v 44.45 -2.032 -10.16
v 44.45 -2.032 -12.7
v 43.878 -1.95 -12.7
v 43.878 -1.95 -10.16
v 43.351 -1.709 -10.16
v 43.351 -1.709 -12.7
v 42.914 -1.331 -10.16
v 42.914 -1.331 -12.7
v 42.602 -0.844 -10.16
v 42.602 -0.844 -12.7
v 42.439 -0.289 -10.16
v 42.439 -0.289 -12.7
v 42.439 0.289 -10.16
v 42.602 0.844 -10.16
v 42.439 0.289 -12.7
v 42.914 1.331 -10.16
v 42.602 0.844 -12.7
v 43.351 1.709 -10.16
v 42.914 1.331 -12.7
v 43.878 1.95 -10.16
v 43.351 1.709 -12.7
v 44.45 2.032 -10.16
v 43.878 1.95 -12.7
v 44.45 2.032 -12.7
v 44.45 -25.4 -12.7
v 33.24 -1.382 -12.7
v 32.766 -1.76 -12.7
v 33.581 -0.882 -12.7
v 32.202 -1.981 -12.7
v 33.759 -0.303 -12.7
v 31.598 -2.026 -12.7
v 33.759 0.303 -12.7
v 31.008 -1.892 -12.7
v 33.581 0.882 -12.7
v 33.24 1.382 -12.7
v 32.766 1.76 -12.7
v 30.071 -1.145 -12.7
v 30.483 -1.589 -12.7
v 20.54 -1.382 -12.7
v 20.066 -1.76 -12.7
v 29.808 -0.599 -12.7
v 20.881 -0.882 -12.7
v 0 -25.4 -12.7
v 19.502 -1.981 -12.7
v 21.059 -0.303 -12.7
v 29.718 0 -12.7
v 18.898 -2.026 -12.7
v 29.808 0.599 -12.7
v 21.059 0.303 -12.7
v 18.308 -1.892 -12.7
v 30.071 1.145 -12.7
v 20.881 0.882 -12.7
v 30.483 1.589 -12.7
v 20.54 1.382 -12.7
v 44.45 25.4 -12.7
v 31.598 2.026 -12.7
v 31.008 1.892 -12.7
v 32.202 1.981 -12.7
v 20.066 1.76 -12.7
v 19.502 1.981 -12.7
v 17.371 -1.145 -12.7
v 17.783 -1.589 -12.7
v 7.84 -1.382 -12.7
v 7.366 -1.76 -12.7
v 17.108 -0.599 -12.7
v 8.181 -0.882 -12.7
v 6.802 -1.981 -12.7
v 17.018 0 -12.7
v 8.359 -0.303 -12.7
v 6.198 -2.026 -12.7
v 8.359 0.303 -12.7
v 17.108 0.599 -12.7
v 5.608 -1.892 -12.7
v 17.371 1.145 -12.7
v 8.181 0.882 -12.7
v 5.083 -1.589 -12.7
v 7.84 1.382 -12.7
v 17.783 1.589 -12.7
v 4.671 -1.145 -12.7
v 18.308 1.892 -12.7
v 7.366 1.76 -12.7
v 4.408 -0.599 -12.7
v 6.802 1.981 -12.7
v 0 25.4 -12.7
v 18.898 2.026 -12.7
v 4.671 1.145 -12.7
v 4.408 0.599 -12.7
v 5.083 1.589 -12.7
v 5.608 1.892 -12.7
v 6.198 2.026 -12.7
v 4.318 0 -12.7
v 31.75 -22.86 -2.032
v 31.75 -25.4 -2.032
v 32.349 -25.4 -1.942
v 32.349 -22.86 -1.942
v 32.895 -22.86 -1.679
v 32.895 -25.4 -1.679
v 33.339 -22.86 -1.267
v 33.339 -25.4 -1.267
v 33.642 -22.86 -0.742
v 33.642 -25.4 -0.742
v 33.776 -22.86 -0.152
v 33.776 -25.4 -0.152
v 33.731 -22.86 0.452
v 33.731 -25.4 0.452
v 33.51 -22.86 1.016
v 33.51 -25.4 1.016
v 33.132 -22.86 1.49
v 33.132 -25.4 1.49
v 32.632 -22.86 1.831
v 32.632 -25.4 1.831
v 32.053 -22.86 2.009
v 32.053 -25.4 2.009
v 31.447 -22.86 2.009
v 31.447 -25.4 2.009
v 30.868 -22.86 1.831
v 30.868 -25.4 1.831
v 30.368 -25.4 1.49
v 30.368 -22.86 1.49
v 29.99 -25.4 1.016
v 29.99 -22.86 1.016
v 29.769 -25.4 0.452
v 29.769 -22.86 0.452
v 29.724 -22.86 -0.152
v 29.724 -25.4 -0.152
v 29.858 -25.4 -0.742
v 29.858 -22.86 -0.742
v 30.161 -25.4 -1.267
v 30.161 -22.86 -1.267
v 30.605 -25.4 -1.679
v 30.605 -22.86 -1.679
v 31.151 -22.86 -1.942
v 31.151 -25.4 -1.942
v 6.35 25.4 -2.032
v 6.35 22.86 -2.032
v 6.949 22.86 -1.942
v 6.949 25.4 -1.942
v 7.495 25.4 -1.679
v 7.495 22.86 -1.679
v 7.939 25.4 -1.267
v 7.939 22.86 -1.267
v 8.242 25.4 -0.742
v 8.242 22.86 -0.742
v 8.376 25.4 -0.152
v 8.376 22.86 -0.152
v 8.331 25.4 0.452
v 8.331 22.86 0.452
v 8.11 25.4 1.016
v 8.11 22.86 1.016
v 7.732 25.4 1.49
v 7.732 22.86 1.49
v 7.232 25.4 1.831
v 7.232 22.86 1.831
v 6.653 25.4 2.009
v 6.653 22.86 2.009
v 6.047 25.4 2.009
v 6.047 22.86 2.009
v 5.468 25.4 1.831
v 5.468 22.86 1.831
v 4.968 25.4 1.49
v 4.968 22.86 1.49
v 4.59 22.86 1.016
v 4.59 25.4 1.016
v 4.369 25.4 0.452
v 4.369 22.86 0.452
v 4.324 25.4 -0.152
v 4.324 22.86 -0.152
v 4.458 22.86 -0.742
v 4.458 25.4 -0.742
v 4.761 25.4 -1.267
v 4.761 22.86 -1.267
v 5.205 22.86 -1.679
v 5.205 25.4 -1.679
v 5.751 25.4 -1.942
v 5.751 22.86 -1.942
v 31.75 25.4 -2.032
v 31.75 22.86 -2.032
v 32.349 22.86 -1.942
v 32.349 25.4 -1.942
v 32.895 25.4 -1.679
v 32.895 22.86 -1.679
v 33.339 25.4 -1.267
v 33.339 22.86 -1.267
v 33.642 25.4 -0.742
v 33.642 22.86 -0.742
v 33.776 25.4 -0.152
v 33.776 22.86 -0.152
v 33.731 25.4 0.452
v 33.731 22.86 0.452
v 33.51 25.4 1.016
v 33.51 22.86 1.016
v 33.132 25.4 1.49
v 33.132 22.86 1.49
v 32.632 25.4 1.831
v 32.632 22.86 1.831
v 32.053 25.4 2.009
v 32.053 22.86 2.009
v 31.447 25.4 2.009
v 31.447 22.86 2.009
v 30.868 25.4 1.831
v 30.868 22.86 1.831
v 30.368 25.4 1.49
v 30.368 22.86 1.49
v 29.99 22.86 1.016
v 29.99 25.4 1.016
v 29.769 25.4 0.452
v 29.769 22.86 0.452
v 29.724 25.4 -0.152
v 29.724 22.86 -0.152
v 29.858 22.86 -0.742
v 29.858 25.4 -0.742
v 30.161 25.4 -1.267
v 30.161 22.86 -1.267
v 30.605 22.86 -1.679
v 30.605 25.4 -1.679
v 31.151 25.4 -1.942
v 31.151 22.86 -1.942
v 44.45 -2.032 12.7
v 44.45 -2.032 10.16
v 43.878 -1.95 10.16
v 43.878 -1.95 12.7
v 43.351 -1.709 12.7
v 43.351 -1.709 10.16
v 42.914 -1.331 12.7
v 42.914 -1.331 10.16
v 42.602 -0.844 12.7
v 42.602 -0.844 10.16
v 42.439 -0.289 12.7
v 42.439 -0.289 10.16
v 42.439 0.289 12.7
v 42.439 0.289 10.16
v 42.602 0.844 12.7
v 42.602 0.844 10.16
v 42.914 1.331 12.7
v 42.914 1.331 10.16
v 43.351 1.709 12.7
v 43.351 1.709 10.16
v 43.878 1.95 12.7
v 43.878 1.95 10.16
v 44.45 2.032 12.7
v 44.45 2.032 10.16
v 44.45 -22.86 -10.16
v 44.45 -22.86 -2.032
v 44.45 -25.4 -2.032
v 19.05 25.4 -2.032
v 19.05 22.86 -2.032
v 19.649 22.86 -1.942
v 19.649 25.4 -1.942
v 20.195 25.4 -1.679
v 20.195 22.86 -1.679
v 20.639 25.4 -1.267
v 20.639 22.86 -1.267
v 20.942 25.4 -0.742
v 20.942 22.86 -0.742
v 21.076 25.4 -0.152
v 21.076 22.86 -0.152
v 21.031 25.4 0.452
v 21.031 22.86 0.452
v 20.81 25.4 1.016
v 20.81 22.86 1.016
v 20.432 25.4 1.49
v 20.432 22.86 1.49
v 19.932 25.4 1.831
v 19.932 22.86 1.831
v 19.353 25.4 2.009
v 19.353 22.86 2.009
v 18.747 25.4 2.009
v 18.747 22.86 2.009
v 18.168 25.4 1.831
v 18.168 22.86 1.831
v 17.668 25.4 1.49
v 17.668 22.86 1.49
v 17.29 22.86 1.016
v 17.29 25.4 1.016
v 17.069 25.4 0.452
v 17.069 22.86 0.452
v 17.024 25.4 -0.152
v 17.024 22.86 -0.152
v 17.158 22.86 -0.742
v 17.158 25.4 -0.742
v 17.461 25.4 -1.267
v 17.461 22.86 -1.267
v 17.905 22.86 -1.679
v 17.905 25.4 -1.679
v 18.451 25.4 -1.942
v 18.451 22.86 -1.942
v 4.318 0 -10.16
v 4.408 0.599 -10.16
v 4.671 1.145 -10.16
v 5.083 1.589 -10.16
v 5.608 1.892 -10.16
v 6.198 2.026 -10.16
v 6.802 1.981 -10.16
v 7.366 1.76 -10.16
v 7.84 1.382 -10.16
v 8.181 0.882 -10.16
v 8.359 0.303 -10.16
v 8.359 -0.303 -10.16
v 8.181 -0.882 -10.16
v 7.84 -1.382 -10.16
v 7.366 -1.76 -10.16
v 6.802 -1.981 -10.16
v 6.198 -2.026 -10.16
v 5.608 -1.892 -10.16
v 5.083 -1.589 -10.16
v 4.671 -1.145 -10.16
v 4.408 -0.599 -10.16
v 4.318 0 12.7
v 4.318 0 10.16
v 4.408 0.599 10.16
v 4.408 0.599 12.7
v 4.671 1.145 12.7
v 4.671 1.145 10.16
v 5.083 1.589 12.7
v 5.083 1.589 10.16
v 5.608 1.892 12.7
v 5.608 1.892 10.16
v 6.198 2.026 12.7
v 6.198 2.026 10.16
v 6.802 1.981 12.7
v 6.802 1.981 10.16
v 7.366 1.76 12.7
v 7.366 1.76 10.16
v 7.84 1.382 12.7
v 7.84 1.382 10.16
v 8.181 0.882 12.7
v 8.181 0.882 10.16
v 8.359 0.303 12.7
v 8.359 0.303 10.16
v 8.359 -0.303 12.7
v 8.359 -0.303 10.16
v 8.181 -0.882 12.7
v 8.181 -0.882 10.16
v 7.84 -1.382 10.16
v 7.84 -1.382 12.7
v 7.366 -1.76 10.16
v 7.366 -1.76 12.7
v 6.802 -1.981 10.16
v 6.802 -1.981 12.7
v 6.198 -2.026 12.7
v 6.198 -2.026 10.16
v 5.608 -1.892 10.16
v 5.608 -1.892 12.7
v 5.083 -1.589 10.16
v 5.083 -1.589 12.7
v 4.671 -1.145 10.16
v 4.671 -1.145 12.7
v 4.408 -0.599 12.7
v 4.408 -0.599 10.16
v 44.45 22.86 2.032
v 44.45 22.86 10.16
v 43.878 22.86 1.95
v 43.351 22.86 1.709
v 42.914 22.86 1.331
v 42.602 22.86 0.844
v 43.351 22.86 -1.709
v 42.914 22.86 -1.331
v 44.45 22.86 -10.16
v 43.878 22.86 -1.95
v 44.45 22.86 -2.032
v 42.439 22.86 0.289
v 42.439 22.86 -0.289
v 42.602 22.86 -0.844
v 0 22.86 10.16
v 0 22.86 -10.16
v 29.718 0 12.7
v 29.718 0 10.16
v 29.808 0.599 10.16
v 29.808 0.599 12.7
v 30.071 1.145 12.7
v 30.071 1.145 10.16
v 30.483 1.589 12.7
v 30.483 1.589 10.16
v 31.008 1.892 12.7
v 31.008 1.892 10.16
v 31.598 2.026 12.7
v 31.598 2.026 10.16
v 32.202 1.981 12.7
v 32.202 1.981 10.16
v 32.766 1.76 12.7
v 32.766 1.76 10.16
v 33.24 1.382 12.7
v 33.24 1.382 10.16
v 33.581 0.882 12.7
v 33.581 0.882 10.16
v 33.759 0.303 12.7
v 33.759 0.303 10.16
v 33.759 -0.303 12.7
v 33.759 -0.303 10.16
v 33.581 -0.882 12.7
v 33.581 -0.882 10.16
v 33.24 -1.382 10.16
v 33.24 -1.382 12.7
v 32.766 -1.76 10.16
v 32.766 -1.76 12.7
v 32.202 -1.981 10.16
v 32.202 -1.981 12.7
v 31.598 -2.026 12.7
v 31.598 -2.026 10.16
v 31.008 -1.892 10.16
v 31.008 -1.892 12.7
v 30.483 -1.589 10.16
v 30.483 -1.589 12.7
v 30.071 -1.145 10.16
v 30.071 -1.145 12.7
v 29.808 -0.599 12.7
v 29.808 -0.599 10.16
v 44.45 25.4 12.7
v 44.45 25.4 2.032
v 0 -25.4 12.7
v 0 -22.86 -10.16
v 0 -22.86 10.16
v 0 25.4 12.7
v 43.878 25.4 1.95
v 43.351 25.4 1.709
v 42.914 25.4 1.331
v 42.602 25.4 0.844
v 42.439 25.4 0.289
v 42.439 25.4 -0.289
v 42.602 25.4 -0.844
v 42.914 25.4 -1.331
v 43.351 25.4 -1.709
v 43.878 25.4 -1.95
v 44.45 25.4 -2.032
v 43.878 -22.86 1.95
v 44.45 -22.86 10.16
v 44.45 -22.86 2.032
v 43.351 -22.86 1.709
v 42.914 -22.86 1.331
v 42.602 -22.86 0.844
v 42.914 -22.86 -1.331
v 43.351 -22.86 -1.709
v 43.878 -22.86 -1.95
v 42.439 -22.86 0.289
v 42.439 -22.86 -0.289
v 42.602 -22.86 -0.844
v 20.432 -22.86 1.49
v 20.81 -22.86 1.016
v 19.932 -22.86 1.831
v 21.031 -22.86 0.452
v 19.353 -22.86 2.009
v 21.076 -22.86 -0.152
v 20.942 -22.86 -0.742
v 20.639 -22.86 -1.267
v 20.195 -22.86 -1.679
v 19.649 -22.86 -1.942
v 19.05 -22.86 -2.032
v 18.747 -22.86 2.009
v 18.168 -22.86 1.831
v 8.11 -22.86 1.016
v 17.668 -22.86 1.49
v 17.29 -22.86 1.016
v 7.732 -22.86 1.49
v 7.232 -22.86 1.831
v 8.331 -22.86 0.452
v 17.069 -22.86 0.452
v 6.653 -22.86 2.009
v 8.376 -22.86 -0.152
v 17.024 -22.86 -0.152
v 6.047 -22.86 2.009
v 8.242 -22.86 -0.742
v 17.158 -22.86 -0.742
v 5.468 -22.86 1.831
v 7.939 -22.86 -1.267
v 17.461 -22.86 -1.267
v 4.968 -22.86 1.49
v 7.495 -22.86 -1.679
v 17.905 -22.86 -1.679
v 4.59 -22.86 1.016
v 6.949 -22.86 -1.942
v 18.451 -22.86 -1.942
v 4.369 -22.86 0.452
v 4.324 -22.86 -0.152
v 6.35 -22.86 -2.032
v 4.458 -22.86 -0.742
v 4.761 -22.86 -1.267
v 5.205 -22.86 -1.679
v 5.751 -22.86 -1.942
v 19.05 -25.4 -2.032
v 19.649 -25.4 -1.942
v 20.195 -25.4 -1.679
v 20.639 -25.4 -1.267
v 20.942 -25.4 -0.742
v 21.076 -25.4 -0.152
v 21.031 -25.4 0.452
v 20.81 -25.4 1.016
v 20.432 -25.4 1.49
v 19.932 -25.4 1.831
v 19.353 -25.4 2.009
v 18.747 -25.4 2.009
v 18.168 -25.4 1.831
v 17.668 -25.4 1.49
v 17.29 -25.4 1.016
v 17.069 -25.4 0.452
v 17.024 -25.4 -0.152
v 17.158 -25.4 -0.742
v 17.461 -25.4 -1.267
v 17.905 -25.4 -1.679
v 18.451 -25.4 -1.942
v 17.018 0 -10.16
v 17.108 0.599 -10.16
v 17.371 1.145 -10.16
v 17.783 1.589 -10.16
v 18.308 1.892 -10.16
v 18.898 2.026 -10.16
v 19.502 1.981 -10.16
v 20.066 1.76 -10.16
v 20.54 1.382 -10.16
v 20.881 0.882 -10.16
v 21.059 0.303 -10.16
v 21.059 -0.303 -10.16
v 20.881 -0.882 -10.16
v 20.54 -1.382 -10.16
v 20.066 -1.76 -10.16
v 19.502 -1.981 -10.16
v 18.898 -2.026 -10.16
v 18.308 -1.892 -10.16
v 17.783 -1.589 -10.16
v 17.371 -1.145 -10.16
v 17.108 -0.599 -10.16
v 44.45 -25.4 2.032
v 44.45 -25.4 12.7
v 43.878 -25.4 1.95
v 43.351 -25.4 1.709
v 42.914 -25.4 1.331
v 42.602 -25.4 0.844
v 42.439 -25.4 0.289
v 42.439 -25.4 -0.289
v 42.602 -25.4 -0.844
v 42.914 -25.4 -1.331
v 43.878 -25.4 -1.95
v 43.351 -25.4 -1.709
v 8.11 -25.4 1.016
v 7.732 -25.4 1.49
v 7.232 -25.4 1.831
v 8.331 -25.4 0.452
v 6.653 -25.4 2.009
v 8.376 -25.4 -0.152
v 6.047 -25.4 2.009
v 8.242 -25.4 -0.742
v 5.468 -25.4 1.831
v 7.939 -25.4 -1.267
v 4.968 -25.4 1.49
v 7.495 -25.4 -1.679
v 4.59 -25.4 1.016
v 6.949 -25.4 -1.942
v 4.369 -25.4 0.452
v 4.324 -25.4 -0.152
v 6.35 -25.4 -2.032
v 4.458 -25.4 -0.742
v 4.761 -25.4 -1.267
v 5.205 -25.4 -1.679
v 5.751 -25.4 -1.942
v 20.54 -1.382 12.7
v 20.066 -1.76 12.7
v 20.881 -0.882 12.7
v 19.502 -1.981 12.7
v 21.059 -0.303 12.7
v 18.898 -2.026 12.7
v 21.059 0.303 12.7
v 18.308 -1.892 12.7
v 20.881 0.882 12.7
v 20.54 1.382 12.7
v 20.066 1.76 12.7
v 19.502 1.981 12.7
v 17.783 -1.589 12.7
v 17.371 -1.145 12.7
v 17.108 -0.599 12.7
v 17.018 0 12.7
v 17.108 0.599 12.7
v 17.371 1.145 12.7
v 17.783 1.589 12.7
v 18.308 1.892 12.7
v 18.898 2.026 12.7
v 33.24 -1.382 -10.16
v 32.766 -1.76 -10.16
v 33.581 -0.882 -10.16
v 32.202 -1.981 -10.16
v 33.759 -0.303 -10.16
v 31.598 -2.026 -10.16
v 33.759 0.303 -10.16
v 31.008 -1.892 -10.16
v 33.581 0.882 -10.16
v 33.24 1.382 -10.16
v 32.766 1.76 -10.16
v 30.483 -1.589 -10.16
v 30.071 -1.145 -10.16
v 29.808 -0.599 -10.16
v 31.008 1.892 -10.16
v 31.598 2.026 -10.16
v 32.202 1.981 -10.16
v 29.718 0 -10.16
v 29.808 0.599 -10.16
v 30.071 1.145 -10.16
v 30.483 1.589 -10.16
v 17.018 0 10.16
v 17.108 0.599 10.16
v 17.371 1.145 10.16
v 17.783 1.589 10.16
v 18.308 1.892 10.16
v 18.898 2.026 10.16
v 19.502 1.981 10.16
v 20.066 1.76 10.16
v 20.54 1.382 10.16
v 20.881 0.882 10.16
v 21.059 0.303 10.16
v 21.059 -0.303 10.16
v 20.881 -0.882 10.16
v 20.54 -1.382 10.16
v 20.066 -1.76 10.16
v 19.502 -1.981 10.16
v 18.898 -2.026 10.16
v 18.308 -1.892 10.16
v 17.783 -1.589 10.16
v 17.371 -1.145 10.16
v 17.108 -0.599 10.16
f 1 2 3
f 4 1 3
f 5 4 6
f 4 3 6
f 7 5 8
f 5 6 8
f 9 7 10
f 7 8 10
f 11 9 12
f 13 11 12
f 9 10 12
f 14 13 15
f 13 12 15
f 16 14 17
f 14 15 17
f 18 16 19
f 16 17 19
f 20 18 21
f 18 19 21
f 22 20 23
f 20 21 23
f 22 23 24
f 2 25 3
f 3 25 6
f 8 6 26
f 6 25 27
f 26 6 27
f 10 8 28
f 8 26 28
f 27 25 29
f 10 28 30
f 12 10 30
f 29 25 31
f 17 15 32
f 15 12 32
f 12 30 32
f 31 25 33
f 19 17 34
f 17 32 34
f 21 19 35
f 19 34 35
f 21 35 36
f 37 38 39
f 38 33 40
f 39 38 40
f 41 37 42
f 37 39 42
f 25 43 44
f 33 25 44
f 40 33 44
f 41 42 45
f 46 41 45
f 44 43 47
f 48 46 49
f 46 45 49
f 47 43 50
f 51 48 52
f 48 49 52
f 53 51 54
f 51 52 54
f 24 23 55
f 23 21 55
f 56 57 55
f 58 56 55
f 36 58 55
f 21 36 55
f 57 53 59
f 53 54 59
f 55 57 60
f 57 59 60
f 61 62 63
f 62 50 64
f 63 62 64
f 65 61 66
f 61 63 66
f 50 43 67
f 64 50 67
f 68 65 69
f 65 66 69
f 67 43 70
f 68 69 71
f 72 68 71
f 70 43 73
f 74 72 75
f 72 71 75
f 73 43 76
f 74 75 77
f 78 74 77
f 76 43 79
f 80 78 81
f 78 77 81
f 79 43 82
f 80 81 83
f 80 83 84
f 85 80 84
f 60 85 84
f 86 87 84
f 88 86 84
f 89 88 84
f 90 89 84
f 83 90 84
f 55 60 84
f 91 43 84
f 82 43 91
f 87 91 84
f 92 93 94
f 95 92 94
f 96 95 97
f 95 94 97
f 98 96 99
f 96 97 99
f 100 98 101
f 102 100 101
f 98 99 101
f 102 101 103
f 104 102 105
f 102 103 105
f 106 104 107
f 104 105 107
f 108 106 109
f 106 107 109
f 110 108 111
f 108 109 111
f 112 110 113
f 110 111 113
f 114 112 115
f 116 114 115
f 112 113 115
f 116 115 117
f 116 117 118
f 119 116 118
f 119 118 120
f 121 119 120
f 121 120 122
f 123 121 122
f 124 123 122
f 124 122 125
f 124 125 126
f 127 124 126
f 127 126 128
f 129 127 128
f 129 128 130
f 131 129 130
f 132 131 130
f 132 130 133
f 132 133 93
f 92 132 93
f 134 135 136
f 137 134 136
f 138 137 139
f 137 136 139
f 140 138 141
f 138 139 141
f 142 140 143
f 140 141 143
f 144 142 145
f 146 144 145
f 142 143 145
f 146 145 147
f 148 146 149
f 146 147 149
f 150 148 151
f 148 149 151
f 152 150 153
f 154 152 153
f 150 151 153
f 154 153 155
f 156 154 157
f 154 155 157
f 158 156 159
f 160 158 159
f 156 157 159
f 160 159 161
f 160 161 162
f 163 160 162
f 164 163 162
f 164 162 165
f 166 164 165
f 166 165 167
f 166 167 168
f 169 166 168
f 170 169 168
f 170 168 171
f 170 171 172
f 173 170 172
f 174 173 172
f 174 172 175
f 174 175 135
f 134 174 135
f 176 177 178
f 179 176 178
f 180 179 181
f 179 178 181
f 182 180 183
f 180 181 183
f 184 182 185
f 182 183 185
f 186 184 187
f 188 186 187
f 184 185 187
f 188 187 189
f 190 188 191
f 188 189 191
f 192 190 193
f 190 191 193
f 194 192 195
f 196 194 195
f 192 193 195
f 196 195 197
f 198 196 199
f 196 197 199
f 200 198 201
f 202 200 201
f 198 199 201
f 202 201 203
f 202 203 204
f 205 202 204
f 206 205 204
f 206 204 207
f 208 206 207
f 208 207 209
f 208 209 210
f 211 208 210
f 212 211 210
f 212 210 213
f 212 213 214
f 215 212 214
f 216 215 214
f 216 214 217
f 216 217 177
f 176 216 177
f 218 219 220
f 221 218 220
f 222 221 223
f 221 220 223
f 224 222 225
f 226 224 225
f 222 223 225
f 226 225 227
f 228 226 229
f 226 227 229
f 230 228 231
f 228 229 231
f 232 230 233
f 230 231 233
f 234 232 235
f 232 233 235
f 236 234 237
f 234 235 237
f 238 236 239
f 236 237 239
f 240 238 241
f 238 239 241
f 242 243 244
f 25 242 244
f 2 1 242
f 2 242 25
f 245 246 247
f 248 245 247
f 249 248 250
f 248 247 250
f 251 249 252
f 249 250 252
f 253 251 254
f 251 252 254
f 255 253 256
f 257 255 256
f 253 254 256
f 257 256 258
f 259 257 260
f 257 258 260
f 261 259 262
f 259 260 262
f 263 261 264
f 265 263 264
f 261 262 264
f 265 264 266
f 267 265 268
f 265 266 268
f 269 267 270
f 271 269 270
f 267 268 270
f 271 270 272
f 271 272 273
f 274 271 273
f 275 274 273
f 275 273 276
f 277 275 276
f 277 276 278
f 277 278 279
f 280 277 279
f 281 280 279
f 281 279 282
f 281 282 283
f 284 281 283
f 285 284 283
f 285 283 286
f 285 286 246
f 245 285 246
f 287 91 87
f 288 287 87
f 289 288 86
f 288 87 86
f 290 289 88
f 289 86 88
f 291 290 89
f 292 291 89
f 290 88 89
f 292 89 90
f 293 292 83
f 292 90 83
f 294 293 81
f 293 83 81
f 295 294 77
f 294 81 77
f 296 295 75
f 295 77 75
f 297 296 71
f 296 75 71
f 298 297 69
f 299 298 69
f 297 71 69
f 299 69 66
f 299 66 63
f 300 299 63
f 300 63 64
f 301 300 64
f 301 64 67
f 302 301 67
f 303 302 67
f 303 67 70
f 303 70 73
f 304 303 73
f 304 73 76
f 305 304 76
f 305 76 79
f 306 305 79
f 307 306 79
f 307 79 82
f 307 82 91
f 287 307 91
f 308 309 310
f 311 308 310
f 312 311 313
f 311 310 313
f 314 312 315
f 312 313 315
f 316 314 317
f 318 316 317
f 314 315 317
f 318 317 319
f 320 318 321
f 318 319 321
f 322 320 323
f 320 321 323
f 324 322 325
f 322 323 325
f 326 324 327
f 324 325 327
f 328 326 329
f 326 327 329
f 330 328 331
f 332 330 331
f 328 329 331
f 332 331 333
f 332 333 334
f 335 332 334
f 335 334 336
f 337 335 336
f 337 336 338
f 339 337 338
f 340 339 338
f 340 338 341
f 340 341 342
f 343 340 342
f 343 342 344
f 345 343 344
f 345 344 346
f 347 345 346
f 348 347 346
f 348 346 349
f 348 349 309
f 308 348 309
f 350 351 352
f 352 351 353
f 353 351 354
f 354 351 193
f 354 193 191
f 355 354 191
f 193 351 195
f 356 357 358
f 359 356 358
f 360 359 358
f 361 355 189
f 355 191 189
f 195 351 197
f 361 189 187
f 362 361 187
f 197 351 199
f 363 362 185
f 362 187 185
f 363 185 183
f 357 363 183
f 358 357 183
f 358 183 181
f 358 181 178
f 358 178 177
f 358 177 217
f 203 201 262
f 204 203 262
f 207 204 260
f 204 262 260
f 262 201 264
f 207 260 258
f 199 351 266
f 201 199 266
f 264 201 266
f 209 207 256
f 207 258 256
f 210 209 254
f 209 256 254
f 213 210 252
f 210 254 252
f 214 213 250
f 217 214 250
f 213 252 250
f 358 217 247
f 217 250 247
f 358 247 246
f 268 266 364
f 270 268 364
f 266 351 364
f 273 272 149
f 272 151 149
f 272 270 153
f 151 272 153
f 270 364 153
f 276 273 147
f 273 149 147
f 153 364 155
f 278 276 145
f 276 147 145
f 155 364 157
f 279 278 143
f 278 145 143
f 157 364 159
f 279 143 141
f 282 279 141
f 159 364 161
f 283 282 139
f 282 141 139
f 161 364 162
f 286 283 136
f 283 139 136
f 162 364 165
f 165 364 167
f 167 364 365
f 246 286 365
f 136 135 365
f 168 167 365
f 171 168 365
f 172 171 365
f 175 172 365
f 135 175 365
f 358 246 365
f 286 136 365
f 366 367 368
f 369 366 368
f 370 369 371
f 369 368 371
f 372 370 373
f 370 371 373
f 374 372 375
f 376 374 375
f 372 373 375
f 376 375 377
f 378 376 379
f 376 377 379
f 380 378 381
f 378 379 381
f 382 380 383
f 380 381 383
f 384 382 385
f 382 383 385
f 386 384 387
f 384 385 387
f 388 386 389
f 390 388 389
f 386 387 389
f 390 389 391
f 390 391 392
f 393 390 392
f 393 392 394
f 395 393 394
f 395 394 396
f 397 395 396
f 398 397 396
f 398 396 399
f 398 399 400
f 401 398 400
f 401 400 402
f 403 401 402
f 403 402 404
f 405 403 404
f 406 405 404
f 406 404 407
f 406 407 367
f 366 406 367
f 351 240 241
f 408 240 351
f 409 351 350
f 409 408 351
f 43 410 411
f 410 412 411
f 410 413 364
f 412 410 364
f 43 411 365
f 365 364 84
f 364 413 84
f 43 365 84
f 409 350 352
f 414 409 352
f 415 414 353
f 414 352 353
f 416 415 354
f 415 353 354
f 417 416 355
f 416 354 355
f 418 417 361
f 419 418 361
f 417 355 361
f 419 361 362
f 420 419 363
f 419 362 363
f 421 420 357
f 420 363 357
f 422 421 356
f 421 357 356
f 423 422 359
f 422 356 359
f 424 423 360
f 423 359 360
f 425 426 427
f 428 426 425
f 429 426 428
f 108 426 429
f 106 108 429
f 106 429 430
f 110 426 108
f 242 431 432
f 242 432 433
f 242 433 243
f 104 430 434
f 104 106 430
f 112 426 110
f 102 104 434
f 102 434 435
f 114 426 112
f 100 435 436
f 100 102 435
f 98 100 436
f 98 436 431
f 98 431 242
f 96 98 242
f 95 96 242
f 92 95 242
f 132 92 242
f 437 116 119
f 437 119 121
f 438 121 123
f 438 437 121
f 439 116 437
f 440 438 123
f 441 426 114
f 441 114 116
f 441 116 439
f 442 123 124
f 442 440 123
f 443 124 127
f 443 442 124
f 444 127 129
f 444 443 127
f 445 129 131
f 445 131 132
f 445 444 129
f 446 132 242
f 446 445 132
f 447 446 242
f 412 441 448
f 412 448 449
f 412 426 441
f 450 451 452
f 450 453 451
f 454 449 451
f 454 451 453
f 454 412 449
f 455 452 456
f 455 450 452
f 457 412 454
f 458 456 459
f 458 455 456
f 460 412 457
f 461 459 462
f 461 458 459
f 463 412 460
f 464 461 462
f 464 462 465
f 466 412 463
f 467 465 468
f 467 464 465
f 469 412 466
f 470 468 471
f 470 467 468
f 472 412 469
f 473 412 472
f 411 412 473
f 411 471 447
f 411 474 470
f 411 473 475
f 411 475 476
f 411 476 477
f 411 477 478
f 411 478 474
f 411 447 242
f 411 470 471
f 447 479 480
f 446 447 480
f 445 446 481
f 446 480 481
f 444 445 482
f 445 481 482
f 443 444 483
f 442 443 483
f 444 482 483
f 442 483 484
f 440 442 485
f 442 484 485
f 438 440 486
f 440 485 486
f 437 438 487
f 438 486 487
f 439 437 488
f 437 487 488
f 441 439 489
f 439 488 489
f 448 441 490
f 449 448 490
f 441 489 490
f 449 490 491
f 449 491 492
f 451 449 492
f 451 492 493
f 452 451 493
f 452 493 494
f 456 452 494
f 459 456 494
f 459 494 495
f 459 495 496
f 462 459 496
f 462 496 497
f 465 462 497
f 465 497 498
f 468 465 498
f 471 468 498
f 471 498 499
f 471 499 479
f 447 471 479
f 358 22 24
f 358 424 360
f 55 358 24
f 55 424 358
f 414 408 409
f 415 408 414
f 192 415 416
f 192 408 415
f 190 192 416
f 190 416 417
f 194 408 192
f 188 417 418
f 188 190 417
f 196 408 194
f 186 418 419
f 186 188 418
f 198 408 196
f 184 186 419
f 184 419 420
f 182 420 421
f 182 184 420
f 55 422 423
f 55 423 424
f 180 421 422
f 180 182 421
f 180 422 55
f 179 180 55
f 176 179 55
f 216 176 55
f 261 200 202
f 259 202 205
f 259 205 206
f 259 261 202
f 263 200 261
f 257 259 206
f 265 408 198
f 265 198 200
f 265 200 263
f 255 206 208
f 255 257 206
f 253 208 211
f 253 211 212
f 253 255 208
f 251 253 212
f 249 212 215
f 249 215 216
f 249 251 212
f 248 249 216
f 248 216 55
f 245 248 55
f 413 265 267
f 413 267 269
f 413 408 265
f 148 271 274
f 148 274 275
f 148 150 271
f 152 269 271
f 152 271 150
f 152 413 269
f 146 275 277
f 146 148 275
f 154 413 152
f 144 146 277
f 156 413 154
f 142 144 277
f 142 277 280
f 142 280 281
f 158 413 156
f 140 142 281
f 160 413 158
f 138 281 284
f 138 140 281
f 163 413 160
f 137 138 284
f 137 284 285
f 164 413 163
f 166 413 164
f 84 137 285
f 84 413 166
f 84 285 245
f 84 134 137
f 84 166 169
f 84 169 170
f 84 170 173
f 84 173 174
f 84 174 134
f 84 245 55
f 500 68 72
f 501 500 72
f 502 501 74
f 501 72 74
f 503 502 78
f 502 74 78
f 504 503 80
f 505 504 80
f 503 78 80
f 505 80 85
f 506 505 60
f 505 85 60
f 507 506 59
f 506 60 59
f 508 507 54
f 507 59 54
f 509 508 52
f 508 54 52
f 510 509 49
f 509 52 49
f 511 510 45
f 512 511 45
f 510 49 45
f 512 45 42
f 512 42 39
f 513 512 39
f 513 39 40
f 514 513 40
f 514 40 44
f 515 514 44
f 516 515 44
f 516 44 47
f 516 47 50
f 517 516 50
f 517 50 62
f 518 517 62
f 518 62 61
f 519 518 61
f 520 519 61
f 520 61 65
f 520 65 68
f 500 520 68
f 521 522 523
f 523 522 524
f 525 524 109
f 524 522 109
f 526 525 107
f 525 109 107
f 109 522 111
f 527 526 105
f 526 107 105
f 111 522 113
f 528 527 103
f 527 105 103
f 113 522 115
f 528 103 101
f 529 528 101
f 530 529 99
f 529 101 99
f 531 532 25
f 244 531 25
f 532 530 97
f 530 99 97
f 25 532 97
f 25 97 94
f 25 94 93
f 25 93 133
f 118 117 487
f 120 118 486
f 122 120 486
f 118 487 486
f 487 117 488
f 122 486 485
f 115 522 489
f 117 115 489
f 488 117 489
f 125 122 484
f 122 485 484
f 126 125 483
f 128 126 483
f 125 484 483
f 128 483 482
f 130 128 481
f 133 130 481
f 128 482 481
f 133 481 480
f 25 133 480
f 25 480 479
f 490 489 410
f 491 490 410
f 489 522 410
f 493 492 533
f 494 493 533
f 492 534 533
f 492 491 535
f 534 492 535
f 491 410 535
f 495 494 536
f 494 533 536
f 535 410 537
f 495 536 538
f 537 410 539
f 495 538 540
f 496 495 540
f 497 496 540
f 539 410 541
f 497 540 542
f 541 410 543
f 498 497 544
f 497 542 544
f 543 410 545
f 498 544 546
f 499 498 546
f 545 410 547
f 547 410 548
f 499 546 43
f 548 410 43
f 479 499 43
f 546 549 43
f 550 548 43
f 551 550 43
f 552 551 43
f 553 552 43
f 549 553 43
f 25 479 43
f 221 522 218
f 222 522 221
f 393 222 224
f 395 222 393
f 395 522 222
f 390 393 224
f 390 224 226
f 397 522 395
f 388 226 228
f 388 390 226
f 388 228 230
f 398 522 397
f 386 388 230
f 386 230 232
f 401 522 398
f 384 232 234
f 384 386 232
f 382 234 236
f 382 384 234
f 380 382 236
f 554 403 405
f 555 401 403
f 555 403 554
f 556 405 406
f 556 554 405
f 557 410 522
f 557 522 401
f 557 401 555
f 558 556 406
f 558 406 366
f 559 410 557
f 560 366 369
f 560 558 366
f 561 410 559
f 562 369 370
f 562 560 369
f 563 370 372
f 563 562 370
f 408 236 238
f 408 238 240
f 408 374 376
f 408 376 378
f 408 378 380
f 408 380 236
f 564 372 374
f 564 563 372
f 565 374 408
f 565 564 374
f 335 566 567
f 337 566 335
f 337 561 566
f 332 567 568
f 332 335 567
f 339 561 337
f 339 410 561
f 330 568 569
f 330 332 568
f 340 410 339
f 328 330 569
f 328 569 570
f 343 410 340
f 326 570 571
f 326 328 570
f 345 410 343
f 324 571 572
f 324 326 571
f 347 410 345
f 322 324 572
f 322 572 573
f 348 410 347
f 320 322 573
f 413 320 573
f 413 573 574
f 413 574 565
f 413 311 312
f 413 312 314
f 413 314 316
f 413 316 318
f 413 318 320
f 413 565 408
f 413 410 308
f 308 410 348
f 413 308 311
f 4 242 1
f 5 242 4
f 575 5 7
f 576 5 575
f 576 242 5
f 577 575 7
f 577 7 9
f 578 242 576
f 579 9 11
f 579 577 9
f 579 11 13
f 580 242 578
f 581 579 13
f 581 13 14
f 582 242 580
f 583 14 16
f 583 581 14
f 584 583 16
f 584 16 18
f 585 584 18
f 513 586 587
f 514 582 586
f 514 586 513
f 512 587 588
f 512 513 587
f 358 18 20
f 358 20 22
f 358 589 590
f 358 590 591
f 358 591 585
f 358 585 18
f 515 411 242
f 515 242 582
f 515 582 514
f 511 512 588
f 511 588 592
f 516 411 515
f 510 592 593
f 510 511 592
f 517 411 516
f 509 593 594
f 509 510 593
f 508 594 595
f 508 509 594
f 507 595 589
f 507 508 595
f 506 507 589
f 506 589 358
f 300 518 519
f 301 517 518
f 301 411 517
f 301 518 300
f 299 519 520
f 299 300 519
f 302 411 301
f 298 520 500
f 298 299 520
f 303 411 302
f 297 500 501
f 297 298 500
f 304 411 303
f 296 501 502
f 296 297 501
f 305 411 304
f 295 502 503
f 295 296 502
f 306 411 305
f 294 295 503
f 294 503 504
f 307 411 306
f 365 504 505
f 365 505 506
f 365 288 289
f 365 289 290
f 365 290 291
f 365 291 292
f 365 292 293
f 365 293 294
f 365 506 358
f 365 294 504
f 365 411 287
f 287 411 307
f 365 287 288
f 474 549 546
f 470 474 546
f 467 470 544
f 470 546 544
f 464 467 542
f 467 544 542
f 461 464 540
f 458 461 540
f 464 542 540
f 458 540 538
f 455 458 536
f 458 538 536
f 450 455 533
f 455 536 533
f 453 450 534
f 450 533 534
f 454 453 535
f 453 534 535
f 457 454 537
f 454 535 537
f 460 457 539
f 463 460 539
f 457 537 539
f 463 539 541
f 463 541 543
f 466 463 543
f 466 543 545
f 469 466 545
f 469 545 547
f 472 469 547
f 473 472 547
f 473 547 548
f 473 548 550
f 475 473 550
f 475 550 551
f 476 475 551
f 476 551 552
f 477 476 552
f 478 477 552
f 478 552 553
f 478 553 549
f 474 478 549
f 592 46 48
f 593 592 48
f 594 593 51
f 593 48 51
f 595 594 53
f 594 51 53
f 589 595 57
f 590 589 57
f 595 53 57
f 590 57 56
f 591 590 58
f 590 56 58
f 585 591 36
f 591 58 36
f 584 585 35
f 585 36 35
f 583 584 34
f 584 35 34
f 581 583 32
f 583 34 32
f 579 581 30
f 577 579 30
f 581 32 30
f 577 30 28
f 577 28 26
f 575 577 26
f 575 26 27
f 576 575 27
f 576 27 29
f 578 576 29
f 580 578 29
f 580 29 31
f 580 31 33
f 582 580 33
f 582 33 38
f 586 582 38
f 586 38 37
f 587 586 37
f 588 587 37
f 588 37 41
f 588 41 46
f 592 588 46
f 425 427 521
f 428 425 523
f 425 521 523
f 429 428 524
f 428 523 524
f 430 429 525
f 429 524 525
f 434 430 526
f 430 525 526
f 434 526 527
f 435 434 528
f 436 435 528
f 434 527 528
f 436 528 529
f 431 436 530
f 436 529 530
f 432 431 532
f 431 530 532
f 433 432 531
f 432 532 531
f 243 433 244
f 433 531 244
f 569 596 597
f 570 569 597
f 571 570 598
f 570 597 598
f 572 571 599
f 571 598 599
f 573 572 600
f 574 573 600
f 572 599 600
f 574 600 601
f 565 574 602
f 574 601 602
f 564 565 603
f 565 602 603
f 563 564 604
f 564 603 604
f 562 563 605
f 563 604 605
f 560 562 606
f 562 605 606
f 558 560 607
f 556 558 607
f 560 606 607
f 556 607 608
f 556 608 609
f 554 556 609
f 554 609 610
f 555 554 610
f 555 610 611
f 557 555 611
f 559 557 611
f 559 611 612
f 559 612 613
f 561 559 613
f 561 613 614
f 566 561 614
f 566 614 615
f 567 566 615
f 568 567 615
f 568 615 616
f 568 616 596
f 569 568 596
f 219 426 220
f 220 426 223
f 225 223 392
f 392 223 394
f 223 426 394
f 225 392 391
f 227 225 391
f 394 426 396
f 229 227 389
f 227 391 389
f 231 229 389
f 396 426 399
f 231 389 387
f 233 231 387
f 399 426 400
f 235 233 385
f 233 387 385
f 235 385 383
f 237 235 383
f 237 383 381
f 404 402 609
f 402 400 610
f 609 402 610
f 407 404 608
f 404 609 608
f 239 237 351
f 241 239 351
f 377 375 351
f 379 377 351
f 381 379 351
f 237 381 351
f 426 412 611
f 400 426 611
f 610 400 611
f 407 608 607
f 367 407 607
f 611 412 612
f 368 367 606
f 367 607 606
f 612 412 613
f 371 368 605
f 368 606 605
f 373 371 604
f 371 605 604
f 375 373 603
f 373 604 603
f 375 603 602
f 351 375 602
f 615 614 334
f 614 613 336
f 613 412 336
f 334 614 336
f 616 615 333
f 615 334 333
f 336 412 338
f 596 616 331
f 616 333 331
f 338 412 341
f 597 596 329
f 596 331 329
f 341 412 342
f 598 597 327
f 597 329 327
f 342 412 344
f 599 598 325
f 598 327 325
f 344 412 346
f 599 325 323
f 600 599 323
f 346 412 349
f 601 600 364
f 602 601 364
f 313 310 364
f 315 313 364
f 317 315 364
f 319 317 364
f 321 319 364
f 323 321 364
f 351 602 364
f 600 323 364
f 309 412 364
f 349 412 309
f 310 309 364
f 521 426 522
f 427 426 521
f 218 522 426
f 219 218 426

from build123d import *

# Parameters (mm, degrees)
SKETCH1_W           = 25.4
SKETCH1_H           = 50.8
SKETCH1_W_2         = 20.32
SKETCH1_H_2         = 45.72
BOSS_EXTRUDE1_DEPTH = 44.45
SKETCH4_R           = 2.032
CUT_EXTRUDE3_DEPTH  = 69.685751798
SKETCH6_R           = 2.032
CUT_EXTRUDE5_DEPTH  = 58.15


with BuildPart() as part:
    # Sketch1 → Boss-Extrude1 (new body)
    with BuildSketch(Plane(origin=(0, 0, 0), x_dir=(0, 0, -1), z_dir=(1, 0, 0))):
        Rectangle(SKETCH1_W, SKETCH1_H)
        Rectangle(SKETCH1_W_2, SKETCH1_H_2, mode=Mode.SUBTRACT)
    extrude(amount=BOSS_EXTRUDE1_DEPTH)

    # Sketch4 → Cut-Extrude3 (cut, through all)
    with BuildSketch(Plane.XZ.offset(25.4)):
        with Locations(Location((6.35, 0, 0), (0, 0, 270))):
            Circle(SKETCH4_R)
        with Locations(Location((19.05, 0, 0), (0, 0, 270))):
            Circle(SKETCH4_R)
        with Locations(Location((31.75, 0, 0), (0, 0, 270))):
            Circle(SKETCH4_R)
        with Locations((44.45, 0)):
            Circle(SKETCH4_R)
        with Locations((57.15, 0)):
            Circle(SKETCH4_R)
        with Locations((69.85, 0)):
            Circle(SKETCH4_R)
    extrude(amount=-CUT_EXTRUDE3_DEPTH, mode=Mode.SUBTRACT)

    # Sketch6 → Cut-Extrude5 (cut, through all)
    with BuildSketch(Plane(origin=(0, 0, -12.7), x_dir=(-1, 0, 0), z_dir=(0, 0, -1))):
        with Locations((-44.45, 0)):
            Circle(SKETCH6_R)
        with Locations((-31.75, 0)):
            Circle(SKETCH6_R)
        with Locations((-19.05, 0)):
            Circle(SKETCH6_R)
        with Locations((-6.35, 0)):
            Circle(SKETCH6_R)
        with Locations((6.35, 0)):
            Circle(SKETCH6_R)
        with Locations((19.05, 0)):
            Circle(SKETCH6_R)
        with Locations((31.75, 0)):
            Circle(SKETCH6_R)
    extrude(amount=-CUT_EXTRUDE5_DEPTH, mode=Mode.SUBTRACT)


solid = part.part
